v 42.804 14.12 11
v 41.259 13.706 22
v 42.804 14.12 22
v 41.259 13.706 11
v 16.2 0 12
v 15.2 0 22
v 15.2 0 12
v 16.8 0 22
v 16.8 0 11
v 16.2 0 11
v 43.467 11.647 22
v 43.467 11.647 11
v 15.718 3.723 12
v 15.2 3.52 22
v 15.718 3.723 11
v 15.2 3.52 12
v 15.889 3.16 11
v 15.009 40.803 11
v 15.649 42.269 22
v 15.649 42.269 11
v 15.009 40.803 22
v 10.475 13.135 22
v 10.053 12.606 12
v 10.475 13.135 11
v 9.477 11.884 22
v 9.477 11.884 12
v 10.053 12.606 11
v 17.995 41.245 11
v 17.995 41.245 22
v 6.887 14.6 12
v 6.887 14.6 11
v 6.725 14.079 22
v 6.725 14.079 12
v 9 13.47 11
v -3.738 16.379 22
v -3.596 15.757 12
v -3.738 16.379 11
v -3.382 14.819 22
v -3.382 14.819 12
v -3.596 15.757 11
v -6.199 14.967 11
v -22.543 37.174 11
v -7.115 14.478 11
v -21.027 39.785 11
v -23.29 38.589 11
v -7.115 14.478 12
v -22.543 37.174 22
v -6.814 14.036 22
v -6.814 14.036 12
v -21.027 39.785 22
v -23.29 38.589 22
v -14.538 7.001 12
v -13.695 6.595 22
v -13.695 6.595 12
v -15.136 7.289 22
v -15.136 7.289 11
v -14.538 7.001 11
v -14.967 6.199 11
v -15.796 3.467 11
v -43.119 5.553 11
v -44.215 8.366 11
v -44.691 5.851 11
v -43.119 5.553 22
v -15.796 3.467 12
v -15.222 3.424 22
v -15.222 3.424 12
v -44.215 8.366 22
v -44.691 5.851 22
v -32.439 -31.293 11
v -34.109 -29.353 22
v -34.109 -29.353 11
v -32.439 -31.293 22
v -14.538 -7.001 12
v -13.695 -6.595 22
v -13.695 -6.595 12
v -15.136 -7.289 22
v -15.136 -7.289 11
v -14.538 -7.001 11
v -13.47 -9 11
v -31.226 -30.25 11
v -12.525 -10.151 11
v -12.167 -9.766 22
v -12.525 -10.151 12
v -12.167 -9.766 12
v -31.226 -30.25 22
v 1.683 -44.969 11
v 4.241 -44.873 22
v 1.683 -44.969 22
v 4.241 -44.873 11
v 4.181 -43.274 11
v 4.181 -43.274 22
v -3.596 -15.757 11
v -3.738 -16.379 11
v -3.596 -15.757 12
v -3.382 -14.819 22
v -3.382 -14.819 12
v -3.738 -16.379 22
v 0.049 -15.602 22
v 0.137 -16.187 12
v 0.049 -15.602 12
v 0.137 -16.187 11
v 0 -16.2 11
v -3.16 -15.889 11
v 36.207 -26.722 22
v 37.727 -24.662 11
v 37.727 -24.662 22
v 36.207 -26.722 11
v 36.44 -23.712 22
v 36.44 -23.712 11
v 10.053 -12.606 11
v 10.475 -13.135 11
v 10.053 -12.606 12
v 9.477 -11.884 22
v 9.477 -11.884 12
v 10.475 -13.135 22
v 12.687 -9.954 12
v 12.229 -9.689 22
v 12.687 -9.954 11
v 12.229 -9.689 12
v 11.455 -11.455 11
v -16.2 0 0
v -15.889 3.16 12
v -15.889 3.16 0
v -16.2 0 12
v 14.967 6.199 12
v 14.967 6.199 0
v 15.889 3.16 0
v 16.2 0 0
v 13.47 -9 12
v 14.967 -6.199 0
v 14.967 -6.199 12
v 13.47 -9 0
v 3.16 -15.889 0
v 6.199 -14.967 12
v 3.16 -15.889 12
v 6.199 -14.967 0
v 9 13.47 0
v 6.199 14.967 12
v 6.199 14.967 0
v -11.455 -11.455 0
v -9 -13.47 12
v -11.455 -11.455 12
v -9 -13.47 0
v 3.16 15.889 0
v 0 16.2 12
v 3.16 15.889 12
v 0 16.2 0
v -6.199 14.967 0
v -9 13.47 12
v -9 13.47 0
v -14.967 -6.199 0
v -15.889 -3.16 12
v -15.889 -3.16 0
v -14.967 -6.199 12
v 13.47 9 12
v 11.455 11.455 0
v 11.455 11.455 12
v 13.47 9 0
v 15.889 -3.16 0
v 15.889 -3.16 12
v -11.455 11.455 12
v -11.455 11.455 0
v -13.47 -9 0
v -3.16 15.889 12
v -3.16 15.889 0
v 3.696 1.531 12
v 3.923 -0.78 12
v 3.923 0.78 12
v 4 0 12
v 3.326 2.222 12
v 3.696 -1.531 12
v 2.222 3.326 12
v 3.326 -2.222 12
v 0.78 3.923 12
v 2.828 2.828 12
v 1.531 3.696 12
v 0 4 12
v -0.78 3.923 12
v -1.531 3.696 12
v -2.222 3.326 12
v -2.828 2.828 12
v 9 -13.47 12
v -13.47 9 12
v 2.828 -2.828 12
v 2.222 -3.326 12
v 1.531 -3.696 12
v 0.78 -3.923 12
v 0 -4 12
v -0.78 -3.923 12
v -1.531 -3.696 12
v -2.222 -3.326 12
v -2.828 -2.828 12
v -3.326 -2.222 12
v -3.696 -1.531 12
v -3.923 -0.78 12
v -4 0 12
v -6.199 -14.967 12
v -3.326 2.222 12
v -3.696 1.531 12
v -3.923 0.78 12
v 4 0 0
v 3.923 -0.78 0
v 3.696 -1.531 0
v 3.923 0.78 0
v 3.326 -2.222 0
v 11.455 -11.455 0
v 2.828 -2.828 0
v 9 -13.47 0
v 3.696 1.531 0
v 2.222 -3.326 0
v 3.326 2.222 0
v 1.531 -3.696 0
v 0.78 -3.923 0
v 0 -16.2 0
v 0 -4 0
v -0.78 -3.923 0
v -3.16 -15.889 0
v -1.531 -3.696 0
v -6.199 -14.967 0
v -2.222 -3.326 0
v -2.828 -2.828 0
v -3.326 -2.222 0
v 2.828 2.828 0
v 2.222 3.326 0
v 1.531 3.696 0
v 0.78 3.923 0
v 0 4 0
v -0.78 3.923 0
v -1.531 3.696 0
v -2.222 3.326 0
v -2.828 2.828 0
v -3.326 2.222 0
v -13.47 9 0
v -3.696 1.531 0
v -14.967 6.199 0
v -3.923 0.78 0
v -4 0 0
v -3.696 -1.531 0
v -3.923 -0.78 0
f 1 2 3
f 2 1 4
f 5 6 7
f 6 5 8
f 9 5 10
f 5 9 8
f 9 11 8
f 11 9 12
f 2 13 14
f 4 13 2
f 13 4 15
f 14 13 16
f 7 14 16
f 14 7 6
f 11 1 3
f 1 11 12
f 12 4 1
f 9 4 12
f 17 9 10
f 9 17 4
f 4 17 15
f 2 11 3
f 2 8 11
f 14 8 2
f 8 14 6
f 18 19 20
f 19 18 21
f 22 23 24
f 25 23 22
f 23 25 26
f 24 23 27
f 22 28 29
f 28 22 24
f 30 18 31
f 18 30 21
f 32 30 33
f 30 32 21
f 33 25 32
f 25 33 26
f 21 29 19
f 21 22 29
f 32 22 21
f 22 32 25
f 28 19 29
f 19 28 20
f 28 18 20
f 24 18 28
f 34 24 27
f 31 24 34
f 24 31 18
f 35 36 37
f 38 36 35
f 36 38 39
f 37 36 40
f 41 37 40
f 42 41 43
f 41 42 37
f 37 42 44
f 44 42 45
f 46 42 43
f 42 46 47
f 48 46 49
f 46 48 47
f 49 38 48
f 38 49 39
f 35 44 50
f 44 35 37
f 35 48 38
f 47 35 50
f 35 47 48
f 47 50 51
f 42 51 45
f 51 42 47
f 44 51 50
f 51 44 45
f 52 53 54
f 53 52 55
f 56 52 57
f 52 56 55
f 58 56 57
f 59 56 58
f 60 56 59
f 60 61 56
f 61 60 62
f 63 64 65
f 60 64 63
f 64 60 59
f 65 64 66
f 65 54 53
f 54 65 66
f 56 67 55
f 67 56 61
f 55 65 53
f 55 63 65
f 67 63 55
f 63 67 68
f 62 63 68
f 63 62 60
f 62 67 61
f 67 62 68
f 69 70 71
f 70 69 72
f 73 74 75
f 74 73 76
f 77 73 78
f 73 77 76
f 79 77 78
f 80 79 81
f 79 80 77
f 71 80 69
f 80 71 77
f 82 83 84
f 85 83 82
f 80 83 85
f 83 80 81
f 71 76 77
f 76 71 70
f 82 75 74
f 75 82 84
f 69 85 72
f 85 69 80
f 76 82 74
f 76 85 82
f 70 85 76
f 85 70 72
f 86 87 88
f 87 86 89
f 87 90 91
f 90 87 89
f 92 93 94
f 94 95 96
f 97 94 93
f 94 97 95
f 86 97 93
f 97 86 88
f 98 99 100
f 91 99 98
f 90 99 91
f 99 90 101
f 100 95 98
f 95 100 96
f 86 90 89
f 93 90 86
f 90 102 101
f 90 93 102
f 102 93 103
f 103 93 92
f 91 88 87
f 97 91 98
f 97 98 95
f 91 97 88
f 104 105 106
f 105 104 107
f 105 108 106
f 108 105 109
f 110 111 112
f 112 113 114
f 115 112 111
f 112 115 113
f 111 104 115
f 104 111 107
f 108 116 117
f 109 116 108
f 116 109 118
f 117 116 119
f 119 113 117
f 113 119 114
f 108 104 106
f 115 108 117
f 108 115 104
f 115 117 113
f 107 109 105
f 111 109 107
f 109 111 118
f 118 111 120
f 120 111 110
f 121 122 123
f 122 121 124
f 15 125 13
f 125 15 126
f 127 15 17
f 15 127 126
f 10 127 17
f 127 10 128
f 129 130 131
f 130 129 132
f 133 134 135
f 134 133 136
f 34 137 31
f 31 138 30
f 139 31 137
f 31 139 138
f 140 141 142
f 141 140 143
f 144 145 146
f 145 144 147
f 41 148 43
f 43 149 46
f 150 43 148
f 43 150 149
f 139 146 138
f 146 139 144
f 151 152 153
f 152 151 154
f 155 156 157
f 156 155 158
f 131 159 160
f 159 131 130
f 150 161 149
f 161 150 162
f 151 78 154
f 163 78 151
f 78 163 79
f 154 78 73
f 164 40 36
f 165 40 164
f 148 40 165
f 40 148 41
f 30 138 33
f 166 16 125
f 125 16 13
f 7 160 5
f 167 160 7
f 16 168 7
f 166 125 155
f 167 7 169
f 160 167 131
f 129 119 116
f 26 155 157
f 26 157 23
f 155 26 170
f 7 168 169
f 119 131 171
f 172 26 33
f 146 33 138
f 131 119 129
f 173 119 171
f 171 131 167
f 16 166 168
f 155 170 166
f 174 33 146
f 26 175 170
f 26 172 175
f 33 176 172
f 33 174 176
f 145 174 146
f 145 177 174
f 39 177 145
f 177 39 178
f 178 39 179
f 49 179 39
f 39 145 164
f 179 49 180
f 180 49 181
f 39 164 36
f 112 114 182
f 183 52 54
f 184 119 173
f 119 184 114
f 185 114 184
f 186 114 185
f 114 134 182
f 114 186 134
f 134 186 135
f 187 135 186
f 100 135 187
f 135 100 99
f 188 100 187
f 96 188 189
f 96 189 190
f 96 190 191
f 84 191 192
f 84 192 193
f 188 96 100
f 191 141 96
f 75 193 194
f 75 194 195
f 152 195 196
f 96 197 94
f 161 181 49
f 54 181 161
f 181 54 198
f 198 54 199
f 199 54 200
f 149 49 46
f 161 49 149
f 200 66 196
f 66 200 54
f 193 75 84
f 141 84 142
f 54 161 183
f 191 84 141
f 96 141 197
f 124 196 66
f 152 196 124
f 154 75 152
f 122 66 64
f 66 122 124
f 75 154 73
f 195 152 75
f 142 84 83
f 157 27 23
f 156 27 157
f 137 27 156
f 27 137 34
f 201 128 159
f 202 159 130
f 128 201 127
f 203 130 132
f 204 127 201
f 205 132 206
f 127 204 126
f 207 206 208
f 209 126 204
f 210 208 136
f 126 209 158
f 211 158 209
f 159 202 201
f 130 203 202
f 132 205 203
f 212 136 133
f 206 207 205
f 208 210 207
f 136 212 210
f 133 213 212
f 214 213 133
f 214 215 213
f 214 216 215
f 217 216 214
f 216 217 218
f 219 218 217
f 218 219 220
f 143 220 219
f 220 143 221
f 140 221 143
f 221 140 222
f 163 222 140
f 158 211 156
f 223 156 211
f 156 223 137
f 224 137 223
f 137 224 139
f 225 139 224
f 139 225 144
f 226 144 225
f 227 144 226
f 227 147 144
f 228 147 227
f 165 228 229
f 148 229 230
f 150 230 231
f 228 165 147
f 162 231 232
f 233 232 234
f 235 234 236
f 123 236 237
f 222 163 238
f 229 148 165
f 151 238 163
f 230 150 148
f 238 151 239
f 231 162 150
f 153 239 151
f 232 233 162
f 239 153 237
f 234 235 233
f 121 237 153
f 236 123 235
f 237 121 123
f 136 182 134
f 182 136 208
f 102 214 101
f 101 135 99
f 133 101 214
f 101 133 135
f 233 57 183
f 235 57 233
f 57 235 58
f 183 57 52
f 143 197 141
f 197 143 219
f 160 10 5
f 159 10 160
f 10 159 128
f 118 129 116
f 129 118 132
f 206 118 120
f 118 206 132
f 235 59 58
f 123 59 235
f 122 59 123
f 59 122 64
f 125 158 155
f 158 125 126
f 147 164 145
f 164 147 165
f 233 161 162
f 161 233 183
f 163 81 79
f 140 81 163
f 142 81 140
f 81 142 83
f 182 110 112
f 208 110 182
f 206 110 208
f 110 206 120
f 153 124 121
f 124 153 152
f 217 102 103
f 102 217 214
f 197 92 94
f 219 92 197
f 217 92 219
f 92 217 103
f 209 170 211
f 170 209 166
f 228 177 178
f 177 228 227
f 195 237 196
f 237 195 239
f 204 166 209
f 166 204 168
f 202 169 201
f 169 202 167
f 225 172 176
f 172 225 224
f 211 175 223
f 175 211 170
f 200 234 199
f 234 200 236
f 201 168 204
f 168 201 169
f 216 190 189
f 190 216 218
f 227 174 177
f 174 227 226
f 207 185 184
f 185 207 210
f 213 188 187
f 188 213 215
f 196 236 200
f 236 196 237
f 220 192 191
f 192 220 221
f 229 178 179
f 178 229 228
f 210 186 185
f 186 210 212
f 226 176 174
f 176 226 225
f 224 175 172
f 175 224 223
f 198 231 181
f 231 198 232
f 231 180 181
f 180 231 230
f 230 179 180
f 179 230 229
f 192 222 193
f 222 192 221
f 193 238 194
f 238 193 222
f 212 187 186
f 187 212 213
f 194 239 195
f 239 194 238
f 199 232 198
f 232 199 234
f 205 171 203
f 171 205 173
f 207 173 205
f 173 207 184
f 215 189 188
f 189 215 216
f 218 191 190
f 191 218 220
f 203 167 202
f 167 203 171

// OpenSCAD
$fn = 32;

// ----------------------------------------------------------------------
// Impeller: 90 mm, 7 blades, 22 mm tall
// ----------------------------------------------------------------------

// --- parameters (mm) ---
center_d = 32.4;          // hub diameter
center_h = 12;            // hub height
wheel_d = 90;             // outer diameter over the blades
blade_count = 7;          // number of blades
blade_t = 1.6;            // blade thickness
blade_h = 10;             // blade height
blade_in_r = 15.2;        // blade root radius
blade_out_r = 43.4;       // blade tip radius
sweep = 15;               // blade sweep, degrees
bore_d = 8;               // shaft bore

module hub() {
  cylinder(h = center_h, d = center_d);
}

module blade() {
  /* blade swept between two boxes: hull of the root and the tip section */
  hull() {
    translate([blade_in_r, 0, center_h - 1])
      cube([blade_t, blade_t * 2.2, blade_h + 1], center = false);
    rotate([0, 0, sweep])
      translate([blade_out_r, 0, center_h - 1])
        cube([blade_t, blade_t * 1.6, blade_h + 1], center = false);
  }
}

module blades() {
  for (i = [0 : blade_count - 1])
    rotate([0, 0, i * 360 / blade_count]) blade();
}

difference() {
  union() {
    hub();
    blades();
  }
  translate([0, 0, -1]) cylinder(h = center_h + blade_h + 0 + 3, d = bore_d);
}
